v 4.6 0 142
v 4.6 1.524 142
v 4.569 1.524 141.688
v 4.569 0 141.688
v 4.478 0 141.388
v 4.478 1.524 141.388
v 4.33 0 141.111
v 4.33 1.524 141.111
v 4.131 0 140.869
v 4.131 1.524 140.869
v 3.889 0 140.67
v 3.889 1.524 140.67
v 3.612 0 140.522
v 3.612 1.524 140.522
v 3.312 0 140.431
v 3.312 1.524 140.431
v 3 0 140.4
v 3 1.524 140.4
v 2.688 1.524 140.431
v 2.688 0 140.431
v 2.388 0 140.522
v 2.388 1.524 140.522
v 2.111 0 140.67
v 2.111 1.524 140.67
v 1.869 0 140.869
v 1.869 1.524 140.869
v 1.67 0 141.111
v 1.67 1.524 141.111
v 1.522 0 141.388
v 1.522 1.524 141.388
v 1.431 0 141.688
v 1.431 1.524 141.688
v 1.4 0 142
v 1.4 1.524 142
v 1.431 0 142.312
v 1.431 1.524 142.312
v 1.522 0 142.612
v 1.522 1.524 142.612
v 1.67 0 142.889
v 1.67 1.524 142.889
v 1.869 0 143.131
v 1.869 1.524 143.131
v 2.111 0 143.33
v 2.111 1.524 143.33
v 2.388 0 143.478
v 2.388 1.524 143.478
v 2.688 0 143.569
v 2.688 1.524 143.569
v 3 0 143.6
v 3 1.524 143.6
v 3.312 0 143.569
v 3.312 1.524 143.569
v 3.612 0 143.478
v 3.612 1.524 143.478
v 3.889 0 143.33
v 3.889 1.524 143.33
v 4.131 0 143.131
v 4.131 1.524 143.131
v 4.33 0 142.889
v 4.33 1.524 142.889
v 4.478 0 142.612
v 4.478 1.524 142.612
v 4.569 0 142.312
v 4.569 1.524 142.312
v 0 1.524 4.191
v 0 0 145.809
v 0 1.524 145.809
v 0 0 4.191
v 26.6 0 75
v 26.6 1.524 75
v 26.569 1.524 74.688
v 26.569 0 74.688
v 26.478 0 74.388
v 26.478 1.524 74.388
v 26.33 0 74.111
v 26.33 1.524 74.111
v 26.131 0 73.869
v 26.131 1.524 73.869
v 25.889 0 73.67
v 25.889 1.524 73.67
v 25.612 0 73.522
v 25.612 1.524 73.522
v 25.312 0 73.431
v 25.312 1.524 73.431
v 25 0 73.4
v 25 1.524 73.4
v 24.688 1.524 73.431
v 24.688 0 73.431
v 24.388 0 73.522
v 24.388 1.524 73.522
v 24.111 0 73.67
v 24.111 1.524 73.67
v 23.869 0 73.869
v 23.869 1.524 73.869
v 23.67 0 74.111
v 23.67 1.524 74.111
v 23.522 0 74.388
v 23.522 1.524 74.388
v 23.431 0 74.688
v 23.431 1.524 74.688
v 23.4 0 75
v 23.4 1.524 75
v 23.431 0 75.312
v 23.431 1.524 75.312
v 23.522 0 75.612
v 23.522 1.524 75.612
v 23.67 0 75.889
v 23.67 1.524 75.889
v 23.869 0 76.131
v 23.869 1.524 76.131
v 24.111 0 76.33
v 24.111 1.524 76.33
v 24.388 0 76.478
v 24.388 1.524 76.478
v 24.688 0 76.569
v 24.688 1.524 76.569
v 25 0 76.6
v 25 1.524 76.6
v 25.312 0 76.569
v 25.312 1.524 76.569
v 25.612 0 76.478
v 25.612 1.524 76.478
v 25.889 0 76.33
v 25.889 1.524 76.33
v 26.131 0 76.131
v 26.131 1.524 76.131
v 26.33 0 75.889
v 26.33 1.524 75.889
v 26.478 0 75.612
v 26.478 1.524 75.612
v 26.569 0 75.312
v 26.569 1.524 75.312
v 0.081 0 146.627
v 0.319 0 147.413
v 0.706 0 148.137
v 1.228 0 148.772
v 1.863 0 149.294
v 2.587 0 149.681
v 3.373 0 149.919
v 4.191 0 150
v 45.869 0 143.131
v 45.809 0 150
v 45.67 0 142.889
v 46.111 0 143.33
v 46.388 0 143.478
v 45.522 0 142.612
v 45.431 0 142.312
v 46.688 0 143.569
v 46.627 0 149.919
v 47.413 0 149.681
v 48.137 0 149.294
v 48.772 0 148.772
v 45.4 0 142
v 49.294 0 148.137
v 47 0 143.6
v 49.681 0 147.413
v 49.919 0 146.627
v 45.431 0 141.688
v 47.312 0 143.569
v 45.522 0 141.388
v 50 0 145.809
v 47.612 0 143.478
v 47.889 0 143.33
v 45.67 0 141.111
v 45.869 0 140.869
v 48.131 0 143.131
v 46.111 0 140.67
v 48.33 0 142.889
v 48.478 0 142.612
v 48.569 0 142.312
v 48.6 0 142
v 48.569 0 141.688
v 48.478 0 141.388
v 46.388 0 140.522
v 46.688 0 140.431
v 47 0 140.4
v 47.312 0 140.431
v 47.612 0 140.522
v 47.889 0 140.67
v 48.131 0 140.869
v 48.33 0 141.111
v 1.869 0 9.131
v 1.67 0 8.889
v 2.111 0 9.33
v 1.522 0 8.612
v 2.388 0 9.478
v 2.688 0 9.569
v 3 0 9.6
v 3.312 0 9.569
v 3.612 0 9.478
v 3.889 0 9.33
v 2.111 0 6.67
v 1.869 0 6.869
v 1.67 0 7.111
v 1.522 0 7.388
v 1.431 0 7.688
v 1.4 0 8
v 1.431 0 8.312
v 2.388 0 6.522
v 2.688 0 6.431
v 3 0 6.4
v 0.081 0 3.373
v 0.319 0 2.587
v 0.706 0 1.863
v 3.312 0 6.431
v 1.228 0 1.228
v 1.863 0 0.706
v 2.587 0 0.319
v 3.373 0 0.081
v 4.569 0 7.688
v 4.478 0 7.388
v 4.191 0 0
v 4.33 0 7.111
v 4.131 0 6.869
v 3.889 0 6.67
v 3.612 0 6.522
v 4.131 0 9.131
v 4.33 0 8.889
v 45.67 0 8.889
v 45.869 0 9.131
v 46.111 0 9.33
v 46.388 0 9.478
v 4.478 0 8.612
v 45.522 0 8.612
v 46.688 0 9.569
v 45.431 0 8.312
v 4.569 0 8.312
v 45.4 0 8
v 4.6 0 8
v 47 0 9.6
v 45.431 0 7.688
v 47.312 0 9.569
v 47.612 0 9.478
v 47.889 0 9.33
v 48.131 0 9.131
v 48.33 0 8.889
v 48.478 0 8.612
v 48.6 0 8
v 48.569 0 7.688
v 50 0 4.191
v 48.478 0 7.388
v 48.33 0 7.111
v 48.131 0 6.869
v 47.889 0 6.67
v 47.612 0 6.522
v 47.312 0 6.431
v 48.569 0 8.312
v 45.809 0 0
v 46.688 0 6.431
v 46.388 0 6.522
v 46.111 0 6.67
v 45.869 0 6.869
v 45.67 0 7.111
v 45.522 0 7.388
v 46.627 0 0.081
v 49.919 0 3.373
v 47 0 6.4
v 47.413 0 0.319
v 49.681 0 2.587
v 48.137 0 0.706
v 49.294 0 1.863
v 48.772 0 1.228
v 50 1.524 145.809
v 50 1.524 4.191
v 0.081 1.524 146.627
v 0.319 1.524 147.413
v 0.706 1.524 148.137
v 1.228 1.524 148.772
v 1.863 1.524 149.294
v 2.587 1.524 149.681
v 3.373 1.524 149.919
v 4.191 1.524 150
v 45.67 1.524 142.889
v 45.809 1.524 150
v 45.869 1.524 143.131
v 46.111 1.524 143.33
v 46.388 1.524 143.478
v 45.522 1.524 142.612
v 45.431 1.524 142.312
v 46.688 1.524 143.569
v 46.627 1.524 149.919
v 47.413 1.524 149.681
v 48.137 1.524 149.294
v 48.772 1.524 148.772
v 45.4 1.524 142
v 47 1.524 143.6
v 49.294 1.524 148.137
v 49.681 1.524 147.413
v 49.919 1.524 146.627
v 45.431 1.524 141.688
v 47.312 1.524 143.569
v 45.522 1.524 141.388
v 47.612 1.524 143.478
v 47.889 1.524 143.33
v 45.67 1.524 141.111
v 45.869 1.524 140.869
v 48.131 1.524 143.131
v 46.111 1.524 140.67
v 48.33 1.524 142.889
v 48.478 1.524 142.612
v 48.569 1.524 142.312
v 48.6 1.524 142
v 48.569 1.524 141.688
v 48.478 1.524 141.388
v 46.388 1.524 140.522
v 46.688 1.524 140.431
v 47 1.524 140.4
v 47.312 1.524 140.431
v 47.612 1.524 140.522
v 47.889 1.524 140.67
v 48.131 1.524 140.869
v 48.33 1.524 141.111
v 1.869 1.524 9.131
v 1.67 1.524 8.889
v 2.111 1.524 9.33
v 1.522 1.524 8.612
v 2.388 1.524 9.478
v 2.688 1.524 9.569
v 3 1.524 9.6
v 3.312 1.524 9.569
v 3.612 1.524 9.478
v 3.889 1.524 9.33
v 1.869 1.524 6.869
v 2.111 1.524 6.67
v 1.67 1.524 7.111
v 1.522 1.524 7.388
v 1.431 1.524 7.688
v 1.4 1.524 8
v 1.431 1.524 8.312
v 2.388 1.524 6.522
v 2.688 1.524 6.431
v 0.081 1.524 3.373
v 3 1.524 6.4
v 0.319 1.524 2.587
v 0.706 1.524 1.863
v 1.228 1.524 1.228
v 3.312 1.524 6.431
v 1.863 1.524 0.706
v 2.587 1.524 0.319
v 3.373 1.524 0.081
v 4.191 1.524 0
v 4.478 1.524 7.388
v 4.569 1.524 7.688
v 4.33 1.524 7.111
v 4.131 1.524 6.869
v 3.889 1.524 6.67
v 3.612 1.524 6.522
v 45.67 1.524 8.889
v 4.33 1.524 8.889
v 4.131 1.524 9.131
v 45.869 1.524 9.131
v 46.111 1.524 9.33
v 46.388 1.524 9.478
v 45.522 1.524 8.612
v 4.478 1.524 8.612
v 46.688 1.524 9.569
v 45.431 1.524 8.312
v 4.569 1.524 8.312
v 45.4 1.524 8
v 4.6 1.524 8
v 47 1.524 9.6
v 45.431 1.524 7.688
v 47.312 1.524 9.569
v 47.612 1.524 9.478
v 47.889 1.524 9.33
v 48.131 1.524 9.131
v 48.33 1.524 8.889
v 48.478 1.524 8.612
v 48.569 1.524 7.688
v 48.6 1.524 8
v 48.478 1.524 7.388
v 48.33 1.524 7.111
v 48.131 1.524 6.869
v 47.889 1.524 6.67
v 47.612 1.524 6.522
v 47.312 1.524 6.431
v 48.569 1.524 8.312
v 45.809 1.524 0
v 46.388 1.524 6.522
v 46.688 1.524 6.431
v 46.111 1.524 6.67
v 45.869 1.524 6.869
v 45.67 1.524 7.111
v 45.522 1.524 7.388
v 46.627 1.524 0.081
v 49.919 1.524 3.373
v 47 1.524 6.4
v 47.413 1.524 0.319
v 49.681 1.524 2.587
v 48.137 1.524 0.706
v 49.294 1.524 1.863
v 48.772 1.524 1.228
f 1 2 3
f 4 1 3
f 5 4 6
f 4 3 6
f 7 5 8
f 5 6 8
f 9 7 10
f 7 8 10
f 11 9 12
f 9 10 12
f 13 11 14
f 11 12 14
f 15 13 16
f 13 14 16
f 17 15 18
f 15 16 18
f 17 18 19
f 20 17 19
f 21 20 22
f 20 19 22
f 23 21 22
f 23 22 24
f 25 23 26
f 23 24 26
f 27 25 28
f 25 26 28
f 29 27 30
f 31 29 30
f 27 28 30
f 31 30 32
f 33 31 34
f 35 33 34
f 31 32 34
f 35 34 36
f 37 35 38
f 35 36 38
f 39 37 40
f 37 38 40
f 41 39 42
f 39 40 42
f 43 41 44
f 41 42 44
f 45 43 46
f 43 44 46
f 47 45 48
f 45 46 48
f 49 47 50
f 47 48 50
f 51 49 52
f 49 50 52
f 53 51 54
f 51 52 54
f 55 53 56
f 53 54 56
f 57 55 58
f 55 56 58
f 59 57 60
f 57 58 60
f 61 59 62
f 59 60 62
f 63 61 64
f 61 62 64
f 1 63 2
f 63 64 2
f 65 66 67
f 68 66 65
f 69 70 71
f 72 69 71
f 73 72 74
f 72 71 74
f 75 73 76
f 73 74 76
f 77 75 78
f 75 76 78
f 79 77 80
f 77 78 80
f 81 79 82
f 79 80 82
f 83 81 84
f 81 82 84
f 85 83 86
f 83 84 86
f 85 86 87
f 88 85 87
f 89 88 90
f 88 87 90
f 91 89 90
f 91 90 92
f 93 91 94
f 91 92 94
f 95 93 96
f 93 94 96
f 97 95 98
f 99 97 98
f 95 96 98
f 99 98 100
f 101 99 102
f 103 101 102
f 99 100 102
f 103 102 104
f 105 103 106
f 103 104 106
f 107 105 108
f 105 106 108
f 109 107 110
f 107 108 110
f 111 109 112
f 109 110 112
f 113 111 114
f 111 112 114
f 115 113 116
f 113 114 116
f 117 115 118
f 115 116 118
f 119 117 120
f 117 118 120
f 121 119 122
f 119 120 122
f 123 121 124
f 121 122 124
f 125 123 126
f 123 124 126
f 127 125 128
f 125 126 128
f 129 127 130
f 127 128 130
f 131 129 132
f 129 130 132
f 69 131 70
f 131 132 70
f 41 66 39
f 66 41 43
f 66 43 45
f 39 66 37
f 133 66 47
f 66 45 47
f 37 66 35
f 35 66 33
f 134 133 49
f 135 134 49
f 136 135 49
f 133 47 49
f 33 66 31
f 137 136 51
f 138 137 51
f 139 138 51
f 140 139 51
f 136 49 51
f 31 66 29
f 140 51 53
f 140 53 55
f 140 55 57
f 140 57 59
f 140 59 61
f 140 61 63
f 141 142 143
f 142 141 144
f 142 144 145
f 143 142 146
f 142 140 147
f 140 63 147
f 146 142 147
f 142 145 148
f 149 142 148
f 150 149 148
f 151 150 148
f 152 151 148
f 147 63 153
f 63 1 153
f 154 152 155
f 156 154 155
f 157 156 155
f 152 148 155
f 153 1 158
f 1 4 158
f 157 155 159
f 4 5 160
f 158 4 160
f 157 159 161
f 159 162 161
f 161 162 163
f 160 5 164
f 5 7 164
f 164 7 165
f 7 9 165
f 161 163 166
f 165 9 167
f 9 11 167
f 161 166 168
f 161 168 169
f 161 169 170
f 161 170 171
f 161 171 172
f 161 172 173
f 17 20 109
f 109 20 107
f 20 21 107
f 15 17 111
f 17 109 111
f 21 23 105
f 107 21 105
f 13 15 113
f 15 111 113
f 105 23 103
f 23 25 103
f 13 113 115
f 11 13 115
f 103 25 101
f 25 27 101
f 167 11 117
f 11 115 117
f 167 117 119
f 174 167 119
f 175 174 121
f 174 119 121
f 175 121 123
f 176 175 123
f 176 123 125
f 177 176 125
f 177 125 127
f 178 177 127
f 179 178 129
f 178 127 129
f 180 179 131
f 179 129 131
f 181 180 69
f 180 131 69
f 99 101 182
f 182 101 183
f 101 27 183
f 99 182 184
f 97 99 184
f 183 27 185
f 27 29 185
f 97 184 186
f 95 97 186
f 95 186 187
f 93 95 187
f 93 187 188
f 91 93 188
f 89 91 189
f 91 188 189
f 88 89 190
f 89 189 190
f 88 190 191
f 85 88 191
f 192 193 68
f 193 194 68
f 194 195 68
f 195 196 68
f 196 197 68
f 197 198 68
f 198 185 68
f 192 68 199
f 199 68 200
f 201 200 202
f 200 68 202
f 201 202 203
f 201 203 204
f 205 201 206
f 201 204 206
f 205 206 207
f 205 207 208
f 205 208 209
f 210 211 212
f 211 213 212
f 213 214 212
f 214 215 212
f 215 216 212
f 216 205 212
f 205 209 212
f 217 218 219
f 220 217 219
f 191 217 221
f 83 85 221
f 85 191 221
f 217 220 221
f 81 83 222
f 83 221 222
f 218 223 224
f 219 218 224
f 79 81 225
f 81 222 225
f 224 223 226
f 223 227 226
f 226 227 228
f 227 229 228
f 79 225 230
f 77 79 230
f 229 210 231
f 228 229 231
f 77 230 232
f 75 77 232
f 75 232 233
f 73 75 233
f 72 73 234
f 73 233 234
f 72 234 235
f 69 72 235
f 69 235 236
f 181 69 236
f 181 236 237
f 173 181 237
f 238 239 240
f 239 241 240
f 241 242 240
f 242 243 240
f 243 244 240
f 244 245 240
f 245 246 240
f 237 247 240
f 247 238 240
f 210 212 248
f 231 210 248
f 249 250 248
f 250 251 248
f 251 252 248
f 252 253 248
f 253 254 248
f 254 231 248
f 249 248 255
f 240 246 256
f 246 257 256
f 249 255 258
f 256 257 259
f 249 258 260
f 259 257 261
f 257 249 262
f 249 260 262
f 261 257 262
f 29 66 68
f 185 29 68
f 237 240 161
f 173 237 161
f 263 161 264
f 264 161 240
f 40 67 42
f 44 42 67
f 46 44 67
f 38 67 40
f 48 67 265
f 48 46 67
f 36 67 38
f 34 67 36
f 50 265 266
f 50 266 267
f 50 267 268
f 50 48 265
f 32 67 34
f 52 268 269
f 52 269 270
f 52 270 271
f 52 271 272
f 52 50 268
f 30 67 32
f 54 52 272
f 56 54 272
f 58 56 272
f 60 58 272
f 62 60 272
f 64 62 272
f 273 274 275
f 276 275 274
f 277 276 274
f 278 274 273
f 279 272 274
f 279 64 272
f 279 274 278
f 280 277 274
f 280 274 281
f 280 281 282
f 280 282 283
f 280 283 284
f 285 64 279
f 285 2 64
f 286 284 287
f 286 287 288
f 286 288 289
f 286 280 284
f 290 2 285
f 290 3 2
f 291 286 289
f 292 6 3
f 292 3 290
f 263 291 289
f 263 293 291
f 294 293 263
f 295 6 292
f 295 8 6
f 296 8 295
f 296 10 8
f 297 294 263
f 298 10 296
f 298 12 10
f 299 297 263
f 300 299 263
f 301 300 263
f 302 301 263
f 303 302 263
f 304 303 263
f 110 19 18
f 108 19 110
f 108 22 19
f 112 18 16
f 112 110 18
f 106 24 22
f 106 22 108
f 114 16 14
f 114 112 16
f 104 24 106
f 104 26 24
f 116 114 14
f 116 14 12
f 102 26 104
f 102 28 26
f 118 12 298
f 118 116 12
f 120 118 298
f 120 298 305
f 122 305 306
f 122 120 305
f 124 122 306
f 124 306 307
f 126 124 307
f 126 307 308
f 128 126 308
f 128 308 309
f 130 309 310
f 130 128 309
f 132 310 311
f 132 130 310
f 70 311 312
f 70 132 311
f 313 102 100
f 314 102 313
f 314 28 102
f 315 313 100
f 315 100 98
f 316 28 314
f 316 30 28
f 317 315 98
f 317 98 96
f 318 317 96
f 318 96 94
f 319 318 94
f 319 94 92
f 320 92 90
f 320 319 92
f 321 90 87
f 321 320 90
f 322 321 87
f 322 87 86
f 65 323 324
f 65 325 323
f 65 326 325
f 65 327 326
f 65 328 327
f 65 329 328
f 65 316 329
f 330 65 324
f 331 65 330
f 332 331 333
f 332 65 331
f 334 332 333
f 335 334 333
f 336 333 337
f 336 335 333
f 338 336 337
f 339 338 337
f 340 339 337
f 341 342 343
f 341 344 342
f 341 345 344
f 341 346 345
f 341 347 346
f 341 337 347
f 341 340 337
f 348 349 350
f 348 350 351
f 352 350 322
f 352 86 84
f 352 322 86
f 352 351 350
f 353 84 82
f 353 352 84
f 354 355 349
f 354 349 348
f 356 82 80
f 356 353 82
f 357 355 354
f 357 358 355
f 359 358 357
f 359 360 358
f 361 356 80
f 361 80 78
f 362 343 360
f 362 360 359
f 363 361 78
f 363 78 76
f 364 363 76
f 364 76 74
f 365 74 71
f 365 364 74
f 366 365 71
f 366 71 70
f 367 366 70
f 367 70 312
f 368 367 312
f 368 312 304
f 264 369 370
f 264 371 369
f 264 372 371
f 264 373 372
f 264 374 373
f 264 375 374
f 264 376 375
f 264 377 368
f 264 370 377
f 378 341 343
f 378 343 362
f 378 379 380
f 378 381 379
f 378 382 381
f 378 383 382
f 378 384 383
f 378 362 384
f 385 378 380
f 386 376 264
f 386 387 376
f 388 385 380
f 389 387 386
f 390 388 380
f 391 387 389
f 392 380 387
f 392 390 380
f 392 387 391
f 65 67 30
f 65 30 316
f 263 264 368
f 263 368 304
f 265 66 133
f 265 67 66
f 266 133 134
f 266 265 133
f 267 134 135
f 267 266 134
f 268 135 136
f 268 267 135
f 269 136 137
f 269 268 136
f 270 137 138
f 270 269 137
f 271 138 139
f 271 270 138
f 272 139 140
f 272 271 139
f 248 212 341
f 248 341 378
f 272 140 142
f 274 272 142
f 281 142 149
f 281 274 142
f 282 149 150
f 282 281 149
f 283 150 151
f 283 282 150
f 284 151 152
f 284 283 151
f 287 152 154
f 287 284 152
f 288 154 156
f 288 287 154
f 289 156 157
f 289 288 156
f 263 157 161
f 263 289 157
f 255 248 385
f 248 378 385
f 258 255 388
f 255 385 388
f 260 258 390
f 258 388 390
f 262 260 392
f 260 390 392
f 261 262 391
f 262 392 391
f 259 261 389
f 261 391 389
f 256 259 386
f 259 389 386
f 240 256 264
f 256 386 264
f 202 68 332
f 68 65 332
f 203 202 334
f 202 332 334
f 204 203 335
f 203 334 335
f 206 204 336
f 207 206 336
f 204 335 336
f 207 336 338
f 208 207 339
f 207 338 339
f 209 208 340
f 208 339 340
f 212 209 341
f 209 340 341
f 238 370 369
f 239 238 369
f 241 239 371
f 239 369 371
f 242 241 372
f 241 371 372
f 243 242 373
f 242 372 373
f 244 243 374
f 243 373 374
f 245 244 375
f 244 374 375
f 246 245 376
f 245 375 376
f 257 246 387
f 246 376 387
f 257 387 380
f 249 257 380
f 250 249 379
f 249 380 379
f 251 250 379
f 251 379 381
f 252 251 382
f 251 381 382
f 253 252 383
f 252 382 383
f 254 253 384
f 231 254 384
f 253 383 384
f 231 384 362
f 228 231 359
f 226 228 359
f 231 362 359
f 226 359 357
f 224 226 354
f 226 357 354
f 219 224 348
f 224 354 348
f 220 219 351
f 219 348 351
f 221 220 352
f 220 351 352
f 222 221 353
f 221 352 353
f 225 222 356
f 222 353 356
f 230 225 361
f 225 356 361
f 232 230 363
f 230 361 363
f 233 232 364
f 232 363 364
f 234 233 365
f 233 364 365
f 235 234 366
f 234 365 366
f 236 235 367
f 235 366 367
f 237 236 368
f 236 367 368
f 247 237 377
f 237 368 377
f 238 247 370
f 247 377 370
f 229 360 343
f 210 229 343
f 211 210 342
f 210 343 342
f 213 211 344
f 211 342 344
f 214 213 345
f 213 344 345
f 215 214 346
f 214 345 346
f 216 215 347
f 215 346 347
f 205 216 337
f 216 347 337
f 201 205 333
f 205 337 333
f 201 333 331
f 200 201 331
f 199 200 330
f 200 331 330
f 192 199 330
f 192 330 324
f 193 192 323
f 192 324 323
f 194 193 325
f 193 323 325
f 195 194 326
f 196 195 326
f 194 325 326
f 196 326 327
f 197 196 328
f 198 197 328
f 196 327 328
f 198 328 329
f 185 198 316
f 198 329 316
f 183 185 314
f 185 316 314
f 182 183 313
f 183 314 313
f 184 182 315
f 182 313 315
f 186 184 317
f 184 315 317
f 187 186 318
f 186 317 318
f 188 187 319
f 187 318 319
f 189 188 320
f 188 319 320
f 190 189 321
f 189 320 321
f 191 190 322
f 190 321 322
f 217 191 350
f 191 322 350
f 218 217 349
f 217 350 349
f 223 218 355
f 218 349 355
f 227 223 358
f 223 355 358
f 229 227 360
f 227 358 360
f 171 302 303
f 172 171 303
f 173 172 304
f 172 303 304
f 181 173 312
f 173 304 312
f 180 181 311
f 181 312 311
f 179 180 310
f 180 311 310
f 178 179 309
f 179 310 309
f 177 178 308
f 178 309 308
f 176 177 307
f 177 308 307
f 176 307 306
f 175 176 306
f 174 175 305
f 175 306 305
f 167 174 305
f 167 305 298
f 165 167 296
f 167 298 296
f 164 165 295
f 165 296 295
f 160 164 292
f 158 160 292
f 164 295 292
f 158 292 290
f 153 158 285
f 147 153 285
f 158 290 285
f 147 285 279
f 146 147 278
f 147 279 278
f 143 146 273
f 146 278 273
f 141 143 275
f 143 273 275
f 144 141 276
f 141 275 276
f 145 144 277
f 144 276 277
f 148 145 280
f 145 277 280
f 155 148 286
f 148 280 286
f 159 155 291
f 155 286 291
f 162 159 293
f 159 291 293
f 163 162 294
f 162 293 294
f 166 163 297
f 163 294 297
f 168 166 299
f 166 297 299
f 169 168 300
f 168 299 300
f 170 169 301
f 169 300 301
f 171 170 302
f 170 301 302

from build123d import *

# Parameters (mm, degrees)
SKETCH1_W            = 50
SKETCH1_H            = 150
BOSS_EXTRUDE1_DEPTH  = 1.524
SKETCH2_R            = 1.6
CUT_EXTRUDE1_DEPTH   = 1.524
LPATTERN1_COUNT      = 2
LPATTERN1_PITCH      = 44
LPATTERN1_COUNT_DIR2 = 2
LPATTERN1_PITCH_DIR2 = 134
FILLET1_R            = 4.191
SKETCH3_R            = 1.6
CUT_EXTRUDE2_DEPTH   = 1.524


with BuildPart() as part:
    # Sketch1 → Boss-Extrude1 (new body)
    with BuildSketch(Plane(origin=(0, 0, 0), x_dir=(1, 0, 0), z_dir=(0, 1, 0))):
        with Locations((25, -75)):
            Rectangle(SKETCH1_W, SKETCH1_H)
    extrude(amount=BOSS_EXTRUDE1_DEPTH)

    # Sketch2 → Cut-Extrude1 (cut)
    with BuildSketch(Plane(origin=(0, 1.524, 0), x_dir=(1, 0, 0), z_dir=(0, 1, 0))):
        with Locations((47, -8)):
            Circle(SKETCH2_R)
    cut_extrude1 = extrude(amount=-CUT_EXTRUDE1_DEPTH, mode=Mode.SUBTRACT)

    # LPattern1: Cut-Extrude1 2 × 2
    with Locations(*[(-i * LPATTERN1_PITCH, 0, j * LPATTERN1_PITCH_DIR2) for i in range(LPATTERN1_COUNT) for j in range(LPATTERN1_COUNT_DIR2) if (i, j) != (0, 0)]):
        add(cut_extrude1, mode=Mode.SUBTRACT)

    # Fillet1
    fillet1_edges = [part.edges().sort_by_distance(p)[0] for p in [
        (0, 0.762, 0),
        (50, 0.762, 0),
        (50, 0.762, 150),
        (0, 0.762, 150),
    ]]
    fillet(fillet1_edges, radius=FILLET1_R)

    # Sketch3 → Cut-Extrude2 (cut)
    with BuildSketch(Plane(origin=(0, 1.524, 0), x_dir=(1, 0, 0), z_dir=(0, 1, 0))):
        with Locations((25, -75)):
            Circle(SKETCH3_R)
    extrude(amount=-CUT_EXTRUDE2_DEPTH, mode=Mode.SUBTRACT)


solid = part.part
